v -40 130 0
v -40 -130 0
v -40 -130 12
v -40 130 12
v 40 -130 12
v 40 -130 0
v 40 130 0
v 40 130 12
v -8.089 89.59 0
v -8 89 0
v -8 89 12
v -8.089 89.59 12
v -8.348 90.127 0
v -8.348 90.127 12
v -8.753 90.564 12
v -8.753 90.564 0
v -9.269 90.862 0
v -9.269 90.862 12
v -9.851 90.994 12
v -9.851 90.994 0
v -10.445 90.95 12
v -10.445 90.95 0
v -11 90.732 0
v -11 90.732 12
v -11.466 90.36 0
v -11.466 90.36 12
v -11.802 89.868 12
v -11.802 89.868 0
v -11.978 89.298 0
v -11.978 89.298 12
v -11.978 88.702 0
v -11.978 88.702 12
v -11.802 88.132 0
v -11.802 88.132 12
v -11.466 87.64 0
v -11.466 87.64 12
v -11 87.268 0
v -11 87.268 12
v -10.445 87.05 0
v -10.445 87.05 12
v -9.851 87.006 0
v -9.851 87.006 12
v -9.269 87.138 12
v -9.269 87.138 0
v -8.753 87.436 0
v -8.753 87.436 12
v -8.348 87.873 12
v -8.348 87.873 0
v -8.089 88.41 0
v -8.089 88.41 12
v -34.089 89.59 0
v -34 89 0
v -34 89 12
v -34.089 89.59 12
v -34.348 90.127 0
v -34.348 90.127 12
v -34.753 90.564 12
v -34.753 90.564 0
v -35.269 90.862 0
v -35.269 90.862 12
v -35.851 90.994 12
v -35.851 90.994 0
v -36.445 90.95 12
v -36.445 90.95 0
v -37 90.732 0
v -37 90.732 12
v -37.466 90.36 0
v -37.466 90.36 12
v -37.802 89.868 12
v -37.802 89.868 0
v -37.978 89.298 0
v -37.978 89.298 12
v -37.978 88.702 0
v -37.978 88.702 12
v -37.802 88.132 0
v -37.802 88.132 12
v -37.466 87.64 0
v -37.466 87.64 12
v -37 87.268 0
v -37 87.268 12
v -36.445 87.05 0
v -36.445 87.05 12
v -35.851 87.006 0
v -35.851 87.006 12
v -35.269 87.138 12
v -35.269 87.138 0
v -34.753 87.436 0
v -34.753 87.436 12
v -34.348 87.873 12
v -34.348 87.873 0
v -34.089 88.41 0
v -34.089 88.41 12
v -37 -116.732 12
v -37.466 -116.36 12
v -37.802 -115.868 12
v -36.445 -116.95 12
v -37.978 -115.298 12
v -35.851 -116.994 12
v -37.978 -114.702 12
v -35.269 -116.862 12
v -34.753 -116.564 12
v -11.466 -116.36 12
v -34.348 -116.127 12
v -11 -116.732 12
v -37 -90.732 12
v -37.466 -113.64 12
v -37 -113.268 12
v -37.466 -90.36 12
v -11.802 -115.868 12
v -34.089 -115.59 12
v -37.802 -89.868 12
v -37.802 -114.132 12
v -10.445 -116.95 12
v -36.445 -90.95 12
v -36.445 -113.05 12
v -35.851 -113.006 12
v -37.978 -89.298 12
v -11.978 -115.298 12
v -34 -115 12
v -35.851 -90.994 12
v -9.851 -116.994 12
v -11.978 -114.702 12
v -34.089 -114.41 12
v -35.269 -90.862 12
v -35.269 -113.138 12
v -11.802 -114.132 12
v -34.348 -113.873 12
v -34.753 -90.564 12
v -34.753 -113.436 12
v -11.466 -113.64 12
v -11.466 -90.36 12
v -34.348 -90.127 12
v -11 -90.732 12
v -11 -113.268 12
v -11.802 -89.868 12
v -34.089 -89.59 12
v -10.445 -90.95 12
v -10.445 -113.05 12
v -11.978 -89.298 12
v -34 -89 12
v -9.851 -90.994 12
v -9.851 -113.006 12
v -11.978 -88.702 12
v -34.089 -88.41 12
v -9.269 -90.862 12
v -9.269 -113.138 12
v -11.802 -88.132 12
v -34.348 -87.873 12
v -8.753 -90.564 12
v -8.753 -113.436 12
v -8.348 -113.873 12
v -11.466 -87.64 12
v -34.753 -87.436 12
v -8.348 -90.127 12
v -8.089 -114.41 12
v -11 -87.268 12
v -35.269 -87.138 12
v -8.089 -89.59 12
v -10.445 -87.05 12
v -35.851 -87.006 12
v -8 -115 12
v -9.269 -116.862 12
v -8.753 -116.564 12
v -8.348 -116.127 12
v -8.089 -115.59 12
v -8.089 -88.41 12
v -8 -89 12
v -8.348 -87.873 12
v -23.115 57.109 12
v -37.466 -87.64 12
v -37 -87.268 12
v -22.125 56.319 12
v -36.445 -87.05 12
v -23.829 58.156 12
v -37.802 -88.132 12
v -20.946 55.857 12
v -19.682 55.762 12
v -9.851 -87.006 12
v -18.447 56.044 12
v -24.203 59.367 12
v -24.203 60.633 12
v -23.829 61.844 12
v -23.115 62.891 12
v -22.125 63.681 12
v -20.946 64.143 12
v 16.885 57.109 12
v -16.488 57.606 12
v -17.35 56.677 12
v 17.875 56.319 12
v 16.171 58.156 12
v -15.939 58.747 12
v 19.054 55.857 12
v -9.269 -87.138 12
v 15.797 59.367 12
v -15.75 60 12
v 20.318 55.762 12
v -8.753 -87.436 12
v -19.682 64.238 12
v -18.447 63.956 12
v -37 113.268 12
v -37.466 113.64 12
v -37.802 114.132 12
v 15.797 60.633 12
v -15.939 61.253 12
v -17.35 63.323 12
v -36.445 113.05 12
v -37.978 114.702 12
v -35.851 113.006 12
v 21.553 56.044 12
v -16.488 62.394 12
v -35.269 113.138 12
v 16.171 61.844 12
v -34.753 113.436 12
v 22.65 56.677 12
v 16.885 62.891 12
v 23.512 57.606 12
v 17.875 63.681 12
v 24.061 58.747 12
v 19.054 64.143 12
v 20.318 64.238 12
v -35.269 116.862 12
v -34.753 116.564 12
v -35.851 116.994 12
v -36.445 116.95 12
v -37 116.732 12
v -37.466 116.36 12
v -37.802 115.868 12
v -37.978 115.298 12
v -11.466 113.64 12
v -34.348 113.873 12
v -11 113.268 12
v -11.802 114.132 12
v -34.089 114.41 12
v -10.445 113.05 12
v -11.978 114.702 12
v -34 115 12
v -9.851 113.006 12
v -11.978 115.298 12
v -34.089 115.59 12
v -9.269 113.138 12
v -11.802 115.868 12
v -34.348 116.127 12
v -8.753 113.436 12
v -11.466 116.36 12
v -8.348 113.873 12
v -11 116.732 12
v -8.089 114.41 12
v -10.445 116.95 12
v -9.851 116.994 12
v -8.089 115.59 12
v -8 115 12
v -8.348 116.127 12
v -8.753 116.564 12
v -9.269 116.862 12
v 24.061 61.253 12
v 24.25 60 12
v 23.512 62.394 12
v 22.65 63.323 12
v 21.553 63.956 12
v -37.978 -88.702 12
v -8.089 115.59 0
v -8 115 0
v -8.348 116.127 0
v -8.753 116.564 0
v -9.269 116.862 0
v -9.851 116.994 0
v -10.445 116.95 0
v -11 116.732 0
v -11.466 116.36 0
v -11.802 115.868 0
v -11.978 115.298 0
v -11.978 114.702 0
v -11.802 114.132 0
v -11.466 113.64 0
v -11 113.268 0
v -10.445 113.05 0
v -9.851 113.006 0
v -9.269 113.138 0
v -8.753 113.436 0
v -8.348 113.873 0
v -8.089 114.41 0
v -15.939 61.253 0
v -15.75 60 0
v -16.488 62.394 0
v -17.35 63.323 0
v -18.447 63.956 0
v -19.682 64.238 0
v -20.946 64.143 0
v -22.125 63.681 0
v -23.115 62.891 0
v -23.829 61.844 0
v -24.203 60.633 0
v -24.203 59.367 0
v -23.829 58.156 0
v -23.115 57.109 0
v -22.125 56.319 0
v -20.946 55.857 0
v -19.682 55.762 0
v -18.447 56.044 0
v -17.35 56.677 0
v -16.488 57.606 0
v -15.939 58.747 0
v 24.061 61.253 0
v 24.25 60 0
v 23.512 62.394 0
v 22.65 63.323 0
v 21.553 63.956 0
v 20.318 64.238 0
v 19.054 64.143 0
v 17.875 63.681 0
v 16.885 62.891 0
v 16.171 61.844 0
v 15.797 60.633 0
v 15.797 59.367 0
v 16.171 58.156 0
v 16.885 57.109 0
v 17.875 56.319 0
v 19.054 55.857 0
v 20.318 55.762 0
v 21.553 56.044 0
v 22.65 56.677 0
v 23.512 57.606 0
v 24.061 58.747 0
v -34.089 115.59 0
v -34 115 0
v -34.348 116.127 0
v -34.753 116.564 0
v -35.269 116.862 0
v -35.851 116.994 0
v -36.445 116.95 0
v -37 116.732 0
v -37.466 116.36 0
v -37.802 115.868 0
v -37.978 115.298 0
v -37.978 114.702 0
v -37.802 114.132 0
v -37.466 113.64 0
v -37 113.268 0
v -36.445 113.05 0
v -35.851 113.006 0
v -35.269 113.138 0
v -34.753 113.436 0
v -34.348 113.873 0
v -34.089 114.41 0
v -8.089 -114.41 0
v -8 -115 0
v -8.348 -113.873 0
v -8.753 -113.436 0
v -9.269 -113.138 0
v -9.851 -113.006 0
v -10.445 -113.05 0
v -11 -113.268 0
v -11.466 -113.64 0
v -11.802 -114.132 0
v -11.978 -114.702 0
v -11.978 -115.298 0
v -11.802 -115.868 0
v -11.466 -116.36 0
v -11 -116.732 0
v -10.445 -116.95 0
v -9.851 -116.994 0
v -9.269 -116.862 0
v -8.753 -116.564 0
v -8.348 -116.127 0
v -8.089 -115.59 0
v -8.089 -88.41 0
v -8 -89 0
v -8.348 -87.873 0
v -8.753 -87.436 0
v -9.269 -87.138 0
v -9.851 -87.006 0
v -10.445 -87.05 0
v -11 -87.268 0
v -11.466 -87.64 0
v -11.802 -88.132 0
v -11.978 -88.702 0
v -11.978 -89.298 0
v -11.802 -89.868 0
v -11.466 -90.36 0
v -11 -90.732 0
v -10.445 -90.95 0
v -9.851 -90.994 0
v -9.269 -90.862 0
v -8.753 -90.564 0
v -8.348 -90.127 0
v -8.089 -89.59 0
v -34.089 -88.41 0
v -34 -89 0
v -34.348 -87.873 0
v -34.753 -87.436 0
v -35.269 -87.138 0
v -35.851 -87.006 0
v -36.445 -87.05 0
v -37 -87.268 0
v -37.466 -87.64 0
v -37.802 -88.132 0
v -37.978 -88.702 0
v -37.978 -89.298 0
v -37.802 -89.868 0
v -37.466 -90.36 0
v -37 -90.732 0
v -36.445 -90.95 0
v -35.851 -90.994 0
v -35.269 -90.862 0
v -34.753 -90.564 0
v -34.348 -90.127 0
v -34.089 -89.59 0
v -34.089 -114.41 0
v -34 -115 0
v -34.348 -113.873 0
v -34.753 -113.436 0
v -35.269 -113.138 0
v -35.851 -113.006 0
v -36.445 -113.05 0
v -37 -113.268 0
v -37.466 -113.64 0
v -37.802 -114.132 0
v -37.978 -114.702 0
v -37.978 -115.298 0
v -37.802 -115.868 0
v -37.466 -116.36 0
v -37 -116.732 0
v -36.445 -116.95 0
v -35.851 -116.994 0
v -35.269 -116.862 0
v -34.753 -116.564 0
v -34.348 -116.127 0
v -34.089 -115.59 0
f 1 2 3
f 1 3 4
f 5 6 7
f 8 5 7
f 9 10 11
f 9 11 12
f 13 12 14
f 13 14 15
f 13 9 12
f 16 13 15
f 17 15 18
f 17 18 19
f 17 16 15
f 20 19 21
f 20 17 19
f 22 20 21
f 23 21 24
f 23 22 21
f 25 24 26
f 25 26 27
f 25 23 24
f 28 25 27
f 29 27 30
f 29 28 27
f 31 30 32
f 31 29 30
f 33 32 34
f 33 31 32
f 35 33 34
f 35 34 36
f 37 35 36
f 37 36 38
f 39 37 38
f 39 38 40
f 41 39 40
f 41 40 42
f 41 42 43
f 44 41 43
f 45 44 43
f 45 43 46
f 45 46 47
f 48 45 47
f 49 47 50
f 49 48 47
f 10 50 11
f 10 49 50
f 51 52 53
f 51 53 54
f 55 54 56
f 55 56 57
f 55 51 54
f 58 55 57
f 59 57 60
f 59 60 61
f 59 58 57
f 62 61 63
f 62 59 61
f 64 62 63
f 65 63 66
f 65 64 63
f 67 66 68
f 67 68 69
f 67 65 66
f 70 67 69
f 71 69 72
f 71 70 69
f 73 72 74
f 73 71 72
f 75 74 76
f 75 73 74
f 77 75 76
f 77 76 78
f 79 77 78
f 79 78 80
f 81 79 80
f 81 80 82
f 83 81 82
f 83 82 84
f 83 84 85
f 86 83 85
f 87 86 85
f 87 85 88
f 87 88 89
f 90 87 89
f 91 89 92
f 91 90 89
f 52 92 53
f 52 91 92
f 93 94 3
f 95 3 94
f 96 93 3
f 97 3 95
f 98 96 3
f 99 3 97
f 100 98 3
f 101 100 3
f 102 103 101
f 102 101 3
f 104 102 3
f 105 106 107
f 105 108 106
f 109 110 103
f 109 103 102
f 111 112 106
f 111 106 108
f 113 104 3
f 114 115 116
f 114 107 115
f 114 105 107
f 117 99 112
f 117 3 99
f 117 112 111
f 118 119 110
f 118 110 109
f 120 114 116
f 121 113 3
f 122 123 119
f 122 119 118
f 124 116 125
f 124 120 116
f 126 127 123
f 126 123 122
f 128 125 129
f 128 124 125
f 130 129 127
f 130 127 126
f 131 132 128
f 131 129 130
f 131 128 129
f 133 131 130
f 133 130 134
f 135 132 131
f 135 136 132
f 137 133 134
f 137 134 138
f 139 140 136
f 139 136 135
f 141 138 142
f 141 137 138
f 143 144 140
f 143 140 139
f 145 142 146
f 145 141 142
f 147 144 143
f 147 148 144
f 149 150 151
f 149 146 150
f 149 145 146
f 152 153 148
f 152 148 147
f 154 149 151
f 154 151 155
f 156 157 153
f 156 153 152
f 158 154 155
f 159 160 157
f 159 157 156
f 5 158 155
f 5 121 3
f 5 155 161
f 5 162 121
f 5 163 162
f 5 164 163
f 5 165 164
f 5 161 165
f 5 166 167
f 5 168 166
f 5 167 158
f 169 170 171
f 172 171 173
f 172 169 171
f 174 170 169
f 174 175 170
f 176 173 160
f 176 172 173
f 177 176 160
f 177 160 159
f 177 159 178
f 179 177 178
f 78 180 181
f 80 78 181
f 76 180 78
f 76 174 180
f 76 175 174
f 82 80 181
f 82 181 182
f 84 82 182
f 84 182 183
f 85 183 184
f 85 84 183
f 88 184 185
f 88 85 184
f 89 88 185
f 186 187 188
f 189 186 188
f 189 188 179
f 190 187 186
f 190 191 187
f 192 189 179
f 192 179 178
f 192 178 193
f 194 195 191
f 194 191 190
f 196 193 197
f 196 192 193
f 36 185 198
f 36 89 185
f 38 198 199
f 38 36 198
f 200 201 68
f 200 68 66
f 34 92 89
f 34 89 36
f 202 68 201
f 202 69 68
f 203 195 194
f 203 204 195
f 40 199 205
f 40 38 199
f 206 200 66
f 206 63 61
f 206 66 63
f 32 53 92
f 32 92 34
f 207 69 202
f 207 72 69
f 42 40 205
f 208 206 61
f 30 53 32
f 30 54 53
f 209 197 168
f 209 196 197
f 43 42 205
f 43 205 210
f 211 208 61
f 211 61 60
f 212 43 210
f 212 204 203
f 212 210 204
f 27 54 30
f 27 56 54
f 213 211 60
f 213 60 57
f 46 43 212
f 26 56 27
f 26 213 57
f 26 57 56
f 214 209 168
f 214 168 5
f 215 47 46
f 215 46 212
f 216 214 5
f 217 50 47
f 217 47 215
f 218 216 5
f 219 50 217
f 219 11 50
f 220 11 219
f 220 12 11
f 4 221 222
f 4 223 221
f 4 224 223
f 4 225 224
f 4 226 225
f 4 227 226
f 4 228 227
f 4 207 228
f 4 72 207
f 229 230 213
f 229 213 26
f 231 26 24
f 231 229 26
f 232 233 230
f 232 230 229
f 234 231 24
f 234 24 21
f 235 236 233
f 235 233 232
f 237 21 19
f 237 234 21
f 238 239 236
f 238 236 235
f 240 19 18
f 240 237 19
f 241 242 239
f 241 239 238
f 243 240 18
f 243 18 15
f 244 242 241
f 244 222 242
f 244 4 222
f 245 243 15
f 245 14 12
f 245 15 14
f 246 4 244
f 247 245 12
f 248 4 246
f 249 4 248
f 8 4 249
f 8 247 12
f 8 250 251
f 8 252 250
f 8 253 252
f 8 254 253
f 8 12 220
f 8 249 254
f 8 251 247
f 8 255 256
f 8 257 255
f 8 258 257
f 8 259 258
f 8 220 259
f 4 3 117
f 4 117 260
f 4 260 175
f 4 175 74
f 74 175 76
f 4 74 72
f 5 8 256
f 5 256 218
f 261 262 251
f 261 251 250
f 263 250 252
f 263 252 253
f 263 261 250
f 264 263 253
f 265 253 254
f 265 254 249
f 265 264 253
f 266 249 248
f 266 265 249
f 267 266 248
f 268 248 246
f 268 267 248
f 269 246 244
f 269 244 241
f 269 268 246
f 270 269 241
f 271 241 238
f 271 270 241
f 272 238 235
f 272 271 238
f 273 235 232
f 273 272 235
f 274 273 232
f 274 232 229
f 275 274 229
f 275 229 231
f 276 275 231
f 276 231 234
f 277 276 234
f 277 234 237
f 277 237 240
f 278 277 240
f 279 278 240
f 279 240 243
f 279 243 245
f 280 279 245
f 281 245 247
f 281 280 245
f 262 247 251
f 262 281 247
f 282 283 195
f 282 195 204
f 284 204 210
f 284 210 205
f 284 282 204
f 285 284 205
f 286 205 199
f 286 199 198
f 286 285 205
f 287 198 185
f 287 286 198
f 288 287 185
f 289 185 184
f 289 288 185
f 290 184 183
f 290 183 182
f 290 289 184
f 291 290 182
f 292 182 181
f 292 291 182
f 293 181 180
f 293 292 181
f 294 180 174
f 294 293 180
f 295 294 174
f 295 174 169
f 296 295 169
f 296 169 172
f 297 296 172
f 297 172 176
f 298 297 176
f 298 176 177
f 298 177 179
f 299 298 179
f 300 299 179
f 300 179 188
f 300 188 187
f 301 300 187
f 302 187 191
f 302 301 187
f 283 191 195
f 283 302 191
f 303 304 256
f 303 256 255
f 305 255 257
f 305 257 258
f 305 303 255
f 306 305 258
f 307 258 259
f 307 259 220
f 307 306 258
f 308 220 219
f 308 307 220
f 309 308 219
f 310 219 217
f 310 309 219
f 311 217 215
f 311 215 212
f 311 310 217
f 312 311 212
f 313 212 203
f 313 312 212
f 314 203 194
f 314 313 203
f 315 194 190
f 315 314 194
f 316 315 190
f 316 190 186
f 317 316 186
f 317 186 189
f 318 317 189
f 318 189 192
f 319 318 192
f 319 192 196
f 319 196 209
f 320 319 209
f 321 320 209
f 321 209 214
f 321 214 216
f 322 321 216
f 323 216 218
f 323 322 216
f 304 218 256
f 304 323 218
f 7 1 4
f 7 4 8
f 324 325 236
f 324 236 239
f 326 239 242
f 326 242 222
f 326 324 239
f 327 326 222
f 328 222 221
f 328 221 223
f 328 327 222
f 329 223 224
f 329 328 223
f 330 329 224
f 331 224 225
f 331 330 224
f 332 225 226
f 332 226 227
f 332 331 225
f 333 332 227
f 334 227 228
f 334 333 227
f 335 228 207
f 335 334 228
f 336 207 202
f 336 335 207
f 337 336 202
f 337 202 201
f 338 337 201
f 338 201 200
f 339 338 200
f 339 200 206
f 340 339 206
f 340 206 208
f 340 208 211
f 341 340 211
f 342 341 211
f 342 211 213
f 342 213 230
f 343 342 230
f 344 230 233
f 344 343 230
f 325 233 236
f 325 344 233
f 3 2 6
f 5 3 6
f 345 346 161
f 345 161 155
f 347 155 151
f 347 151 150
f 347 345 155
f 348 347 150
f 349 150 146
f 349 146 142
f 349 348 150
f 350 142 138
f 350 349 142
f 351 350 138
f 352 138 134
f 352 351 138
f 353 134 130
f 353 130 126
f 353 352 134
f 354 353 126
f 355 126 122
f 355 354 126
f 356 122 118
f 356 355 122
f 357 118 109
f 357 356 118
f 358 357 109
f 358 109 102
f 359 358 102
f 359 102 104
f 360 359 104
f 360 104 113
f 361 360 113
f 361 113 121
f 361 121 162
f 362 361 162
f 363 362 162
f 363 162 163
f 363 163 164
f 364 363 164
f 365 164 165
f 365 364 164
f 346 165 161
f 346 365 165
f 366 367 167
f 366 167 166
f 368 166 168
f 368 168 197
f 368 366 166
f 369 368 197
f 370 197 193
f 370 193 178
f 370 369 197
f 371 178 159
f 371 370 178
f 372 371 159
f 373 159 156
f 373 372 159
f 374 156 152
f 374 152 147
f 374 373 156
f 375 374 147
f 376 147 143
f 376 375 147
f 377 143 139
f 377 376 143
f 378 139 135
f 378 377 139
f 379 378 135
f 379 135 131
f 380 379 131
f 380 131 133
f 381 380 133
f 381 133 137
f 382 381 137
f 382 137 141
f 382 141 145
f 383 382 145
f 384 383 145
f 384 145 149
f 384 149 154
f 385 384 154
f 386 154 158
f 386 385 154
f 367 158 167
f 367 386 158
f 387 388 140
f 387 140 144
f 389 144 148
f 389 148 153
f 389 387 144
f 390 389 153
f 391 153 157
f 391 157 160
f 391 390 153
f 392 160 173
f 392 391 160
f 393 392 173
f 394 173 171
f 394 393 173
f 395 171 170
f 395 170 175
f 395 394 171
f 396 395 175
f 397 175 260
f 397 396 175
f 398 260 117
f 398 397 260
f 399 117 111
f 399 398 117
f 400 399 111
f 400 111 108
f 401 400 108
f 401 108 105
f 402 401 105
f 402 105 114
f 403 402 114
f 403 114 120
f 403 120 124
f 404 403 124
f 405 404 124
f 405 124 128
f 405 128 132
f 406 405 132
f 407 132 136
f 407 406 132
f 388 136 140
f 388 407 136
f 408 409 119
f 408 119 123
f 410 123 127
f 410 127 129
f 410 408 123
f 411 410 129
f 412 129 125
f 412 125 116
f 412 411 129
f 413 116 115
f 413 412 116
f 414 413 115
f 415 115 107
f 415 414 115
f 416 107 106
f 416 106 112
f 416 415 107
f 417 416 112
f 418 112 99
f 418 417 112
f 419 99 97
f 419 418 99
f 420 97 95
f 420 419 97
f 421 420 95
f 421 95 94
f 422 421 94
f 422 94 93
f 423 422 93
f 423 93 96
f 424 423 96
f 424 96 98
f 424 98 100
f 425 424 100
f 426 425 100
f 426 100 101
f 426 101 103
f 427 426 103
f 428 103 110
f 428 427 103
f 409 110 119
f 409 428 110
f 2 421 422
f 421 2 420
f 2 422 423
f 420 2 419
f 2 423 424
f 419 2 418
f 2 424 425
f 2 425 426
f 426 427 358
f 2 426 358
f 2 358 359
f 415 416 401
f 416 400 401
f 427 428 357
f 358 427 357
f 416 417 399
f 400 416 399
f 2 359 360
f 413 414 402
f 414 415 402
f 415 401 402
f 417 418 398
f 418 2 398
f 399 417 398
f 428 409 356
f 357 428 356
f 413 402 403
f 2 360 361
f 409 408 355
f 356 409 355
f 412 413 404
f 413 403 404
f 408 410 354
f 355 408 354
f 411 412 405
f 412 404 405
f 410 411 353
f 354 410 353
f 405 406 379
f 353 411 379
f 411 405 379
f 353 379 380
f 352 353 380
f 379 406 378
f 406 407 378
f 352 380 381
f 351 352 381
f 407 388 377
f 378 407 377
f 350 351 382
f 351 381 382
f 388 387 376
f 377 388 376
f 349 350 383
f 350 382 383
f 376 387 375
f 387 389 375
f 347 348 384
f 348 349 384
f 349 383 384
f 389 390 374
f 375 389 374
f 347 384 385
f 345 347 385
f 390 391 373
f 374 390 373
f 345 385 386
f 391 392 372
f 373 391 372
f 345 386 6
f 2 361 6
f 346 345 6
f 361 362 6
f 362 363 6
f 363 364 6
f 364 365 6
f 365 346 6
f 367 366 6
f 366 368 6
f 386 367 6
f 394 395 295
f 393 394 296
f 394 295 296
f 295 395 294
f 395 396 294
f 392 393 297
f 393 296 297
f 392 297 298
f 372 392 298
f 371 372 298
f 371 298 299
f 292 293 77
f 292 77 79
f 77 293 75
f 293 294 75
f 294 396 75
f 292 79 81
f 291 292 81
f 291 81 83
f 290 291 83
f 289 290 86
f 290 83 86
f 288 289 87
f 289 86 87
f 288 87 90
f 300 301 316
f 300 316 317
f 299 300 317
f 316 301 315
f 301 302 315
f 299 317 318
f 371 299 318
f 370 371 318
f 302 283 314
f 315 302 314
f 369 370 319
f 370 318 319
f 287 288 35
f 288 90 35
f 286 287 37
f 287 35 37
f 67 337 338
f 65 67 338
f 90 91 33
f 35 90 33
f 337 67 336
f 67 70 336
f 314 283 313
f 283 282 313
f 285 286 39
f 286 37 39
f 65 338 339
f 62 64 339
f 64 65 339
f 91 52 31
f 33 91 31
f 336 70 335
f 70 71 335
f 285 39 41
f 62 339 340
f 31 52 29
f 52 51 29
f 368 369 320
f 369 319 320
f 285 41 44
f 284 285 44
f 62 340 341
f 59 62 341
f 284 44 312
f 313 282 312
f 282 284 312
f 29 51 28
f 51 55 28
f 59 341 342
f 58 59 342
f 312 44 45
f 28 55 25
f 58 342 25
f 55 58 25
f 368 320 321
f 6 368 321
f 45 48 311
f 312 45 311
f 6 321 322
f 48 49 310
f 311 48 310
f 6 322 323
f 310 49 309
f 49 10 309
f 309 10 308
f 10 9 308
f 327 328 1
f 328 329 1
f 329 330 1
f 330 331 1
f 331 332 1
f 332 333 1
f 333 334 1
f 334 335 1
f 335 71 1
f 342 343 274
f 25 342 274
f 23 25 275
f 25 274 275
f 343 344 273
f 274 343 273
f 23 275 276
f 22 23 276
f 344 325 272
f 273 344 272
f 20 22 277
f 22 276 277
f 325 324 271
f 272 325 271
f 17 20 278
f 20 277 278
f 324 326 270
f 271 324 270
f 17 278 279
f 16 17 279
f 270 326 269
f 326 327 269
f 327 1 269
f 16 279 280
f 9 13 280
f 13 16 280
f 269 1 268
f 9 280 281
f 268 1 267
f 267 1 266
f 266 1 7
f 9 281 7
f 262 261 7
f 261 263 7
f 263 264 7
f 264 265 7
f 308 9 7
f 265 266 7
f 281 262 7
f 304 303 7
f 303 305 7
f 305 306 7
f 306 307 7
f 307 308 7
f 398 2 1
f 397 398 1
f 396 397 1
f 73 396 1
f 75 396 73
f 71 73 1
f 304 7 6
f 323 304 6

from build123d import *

# Parameters (mm, degrees)
F0_W     = 80
F0_H     = 260
F0_R     = 2
F0_R_2   = 4.25
F1_DEPTH = 12


with BuildPart() as f1:
    # F0 (on Top) → F1 (new body)
    with BuildSketch(Plane.XY):
        Rectangle(F0_W, F0_H)
        with Locations((-36, -115)):
            Circle(F0_R, mode=Mode.SUBTRACT)
        with Locations((-36, -89)):
            Circle(F0_R, mode=Mode.SUBTRACT)
        with Locations((-10, -115)):
            Circle(F0_R, mode=Mode.SUBTRACT)
        with Locations((-10, -89)):
            Circle(F0_R, mode=Mode.SUBTRACT)
        with Locations((-20, 60)):
            Circle(F0_R_2, mode=Mode.SUBTRACT)
        with Locations((-36, 89)):
            Circle(F0_R, mode=Mode.SUBTRACT)
        with Locations((-36, 115)):
            Circle(F0_R, mode=Mode.SUBTRACT)
        with Locations((-10, 89)):
            Circle(F0_R, mode=Mode.SUBTRACT)
        with Locations((-10, 115)):
            Circle(F0_R, mode=Mode.SUBTRACT)
        with Locations((20, 60)):
            Circle(F0_R_2, mode=Mode.SUBTRACT)
    extrude(amount=F1_DEPTH)


solid = f1.part
